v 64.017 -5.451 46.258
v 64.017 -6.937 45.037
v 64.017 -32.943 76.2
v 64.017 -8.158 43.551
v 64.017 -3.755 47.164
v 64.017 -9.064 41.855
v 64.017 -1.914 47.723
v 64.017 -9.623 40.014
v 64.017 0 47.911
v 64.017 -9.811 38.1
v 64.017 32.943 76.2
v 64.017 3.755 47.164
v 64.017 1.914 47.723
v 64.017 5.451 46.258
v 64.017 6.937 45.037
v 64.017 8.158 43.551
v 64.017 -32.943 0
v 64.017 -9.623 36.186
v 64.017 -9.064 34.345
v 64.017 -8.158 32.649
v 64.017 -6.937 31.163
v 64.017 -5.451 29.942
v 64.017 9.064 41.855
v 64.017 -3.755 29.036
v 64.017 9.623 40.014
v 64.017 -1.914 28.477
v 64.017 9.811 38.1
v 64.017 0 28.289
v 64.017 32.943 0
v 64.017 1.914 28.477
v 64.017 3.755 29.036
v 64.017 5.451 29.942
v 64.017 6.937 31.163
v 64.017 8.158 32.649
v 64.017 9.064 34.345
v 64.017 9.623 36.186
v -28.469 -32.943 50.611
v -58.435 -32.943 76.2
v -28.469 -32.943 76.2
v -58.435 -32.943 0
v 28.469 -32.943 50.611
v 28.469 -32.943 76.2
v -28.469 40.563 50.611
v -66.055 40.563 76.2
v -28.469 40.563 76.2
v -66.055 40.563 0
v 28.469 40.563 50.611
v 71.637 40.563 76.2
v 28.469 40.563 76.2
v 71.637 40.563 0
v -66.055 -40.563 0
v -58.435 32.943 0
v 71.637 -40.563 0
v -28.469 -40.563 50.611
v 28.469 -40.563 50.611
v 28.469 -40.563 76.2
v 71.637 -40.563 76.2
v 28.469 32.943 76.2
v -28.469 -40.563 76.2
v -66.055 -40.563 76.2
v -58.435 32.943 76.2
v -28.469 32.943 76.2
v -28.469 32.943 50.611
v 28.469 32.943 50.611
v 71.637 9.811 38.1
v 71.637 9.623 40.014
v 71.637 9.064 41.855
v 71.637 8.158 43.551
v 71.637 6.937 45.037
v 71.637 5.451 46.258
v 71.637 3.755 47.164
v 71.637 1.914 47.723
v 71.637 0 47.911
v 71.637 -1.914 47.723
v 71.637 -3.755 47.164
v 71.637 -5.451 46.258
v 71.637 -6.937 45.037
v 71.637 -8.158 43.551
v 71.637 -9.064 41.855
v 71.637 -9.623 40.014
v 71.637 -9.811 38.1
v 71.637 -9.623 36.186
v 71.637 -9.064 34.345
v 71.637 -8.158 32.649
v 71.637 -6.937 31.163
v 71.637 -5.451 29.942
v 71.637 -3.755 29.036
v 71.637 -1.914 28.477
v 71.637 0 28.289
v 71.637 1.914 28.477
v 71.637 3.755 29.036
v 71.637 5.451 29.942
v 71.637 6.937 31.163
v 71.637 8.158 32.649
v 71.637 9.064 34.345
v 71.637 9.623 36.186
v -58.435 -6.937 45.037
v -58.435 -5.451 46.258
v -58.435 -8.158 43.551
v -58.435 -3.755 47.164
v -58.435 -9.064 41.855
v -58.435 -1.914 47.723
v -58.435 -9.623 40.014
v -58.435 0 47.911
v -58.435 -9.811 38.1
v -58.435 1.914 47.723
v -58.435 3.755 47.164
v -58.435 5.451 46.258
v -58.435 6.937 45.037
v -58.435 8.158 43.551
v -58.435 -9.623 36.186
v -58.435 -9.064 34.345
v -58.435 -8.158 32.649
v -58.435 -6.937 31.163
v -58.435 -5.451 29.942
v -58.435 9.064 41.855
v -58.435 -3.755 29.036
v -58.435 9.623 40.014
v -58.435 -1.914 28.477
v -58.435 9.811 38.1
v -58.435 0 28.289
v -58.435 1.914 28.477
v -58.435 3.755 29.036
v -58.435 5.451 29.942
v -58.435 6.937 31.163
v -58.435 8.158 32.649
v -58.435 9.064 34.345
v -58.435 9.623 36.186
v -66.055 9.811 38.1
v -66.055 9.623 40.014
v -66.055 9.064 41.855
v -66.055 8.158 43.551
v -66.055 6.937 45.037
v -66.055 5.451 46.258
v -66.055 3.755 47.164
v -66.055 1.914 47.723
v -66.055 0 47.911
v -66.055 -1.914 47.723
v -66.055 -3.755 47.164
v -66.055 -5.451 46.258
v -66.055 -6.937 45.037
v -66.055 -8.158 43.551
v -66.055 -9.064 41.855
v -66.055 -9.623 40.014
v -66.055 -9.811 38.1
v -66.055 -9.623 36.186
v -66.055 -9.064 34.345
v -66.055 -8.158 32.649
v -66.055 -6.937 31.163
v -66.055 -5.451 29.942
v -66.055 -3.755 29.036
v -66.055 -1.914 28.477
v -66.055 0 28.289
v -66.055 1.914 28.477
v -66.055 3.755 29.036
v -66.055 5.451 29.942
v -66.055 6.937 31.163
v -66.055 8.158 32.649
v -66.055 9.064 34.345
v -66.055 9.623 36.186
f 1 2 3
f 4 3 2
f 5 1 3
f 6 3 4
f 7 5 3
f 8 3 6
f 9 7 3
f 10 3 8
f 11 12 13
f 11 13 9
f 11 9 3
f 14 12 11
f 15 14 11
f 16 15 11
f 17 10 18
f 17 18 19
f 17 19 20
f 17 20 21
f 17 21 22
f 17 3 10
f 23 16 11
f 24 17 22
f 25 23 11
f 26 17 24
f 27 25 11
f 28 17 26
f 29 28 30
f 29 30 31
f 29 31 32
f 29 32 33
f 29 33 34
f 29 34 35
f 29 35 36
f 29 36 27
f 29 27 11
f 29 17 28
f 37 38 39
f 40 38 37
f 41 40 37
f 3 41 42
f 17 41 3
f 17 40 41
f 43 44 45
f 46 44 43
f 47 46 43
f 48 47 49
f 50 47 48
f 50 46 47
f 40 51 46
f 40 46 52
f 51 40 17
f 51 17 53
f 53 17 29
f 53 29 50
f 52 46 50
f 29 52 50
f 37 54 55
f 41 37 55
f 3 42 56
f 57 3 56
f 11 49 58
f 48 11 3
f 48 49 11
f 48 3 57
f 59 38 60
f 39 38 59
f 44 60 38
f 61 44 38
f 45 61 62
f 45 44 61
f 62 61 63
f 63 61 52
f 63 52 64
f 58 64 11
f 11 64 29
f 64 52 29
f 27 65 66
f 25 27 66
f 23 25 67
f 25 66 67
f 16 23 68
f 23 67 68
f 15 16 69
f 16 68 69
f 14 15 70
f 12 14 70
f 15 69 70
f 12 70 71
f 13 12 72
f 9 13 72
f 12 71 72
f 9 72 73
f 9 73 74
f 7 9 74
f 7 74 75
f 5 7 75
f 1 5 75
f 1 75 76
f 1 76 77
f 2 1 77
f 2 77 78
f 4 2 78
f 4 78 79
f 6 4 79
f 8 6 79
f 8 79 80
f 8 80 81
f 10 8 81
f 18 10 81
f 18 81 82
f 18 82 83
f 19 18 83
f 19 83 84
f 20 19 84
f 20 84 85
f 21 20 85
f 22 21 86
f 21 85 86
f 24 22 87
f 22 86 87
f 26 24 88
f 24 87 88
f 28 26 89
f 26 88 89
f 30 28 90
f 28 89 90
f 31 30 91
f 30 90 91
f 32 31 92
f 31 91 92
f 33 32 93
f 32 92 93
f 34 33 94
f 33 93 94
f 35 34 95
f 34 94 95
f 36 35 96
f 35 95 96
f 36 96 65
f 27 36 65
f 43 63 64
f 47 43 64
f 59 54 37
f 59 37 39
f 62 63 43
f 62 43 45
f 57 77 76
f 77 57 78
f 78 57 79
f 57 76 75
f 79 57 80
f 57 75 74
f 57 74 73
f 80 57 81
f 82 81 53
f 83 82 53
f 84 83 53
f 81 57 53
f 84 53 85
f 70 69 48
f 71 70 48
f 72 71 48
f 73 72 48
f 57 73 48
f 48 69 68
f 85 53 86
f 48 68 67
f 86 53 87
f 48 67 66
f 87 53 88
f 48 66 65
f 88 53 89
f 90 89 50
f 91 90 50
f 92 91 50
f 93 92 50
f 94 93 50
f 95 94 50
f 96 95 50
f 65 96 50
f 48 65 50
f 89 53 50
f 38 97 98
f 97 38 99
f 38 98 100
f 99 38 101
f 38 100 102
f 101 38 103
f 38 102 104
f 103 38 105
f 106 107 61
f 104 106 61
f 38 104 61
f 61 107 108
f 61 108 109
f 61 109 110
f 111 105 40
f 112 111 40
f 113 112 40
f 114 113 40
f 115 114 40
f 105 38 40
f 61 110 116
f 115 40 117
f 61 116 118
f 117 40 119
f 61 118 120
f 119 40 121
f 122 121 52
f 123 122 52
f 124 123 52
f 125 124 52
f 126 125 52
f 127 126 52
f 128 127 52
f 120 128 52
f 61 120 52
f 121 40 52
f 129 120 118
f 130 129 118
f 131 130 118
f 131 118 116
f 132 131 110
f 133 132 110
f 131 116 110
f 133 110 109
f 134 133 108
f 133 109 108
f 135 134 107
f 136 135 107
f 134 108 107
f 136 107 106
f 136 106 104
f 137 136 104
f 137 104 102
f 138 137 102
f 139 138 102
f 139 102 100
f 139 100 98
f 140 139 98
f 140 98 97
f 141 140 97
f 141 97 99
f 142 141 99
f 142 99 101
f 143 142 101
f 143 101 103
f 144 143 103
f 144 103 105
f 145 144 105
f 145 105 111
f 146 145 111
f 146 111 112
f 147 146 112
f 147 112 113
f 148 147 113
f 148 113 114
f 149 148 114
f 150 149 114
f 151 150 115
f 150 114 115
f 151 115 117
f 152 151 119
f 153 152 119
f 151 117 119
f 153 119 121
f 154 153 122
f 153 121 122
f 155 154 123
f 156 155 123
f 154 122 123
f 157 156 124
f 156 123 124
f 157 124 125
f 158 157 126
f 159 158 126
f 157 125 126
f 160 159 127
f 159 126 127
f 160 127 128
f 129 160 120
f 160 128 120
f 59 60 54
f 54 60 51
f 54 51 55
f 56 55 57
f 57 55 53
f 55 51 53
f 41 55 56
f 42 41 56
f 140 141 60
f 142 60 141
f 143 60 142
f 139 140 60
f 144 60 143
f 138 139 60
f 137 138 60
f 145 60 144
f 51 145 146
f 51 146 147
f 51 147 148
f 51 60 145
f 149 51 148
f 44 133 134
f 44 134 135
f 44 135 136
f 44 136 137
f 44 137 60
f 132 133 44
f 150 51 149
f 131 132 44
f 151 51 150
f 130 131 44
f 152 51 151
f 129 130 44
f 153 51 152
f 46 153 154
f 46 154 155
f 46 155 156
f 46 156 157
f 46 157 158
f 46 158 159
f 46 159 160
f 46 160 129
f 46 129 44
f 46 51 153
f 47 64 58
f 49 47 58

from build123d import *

# Parameters (mm, degrees)
F0_W     = 137.691636
F0_H     = 81.126414
F1_DEPTH = 76.2
F2_T     = -7.62
F3_W     = 56.93736
F3_H     = 51.178044
F4_DEPTH = 81.127414
F5_R     = 9.811044
F6_DEPTH = 137.692636


with BuildPart() as f1:
    # F0 (on Top) → F1 (new body)
    with BuildSketch(Plane.XY):
        with Locations((2.791045, 0)):
            Rectangle(F0_W, F0_H)
    extrude(amount=F1_DEPTH)

    # F2
    f2_openings = [f1.faces().sort_by_distance(p)[0] for p in [
        (2.791045, 0, 76.2),
        (2.791045, 0, 0),
    ]]
    offset(amount=F2_T, openings=f2_openings)

    # F3 (on face) → F4 (cut, through all)
    with BuildSketch(Plane.XZ.offset(40.563207)):
        with Locations((0, 76.2)):
            Rectangle(F3_W, F3_H)
    extrude(amount=-F4_DEPTH, mode=Mode.SUBTRACT)

    # F5 (on face) → F6 (cut, through all)
    with BuildSketch(Plane.YZ.offset(71.636863)):
        with Locations((0, 38.1)):
            Circle(F5_R)
    extrude(amount=-F6_DEPTH, mode=Mode.SUBTRACT)


solid = f1.part
